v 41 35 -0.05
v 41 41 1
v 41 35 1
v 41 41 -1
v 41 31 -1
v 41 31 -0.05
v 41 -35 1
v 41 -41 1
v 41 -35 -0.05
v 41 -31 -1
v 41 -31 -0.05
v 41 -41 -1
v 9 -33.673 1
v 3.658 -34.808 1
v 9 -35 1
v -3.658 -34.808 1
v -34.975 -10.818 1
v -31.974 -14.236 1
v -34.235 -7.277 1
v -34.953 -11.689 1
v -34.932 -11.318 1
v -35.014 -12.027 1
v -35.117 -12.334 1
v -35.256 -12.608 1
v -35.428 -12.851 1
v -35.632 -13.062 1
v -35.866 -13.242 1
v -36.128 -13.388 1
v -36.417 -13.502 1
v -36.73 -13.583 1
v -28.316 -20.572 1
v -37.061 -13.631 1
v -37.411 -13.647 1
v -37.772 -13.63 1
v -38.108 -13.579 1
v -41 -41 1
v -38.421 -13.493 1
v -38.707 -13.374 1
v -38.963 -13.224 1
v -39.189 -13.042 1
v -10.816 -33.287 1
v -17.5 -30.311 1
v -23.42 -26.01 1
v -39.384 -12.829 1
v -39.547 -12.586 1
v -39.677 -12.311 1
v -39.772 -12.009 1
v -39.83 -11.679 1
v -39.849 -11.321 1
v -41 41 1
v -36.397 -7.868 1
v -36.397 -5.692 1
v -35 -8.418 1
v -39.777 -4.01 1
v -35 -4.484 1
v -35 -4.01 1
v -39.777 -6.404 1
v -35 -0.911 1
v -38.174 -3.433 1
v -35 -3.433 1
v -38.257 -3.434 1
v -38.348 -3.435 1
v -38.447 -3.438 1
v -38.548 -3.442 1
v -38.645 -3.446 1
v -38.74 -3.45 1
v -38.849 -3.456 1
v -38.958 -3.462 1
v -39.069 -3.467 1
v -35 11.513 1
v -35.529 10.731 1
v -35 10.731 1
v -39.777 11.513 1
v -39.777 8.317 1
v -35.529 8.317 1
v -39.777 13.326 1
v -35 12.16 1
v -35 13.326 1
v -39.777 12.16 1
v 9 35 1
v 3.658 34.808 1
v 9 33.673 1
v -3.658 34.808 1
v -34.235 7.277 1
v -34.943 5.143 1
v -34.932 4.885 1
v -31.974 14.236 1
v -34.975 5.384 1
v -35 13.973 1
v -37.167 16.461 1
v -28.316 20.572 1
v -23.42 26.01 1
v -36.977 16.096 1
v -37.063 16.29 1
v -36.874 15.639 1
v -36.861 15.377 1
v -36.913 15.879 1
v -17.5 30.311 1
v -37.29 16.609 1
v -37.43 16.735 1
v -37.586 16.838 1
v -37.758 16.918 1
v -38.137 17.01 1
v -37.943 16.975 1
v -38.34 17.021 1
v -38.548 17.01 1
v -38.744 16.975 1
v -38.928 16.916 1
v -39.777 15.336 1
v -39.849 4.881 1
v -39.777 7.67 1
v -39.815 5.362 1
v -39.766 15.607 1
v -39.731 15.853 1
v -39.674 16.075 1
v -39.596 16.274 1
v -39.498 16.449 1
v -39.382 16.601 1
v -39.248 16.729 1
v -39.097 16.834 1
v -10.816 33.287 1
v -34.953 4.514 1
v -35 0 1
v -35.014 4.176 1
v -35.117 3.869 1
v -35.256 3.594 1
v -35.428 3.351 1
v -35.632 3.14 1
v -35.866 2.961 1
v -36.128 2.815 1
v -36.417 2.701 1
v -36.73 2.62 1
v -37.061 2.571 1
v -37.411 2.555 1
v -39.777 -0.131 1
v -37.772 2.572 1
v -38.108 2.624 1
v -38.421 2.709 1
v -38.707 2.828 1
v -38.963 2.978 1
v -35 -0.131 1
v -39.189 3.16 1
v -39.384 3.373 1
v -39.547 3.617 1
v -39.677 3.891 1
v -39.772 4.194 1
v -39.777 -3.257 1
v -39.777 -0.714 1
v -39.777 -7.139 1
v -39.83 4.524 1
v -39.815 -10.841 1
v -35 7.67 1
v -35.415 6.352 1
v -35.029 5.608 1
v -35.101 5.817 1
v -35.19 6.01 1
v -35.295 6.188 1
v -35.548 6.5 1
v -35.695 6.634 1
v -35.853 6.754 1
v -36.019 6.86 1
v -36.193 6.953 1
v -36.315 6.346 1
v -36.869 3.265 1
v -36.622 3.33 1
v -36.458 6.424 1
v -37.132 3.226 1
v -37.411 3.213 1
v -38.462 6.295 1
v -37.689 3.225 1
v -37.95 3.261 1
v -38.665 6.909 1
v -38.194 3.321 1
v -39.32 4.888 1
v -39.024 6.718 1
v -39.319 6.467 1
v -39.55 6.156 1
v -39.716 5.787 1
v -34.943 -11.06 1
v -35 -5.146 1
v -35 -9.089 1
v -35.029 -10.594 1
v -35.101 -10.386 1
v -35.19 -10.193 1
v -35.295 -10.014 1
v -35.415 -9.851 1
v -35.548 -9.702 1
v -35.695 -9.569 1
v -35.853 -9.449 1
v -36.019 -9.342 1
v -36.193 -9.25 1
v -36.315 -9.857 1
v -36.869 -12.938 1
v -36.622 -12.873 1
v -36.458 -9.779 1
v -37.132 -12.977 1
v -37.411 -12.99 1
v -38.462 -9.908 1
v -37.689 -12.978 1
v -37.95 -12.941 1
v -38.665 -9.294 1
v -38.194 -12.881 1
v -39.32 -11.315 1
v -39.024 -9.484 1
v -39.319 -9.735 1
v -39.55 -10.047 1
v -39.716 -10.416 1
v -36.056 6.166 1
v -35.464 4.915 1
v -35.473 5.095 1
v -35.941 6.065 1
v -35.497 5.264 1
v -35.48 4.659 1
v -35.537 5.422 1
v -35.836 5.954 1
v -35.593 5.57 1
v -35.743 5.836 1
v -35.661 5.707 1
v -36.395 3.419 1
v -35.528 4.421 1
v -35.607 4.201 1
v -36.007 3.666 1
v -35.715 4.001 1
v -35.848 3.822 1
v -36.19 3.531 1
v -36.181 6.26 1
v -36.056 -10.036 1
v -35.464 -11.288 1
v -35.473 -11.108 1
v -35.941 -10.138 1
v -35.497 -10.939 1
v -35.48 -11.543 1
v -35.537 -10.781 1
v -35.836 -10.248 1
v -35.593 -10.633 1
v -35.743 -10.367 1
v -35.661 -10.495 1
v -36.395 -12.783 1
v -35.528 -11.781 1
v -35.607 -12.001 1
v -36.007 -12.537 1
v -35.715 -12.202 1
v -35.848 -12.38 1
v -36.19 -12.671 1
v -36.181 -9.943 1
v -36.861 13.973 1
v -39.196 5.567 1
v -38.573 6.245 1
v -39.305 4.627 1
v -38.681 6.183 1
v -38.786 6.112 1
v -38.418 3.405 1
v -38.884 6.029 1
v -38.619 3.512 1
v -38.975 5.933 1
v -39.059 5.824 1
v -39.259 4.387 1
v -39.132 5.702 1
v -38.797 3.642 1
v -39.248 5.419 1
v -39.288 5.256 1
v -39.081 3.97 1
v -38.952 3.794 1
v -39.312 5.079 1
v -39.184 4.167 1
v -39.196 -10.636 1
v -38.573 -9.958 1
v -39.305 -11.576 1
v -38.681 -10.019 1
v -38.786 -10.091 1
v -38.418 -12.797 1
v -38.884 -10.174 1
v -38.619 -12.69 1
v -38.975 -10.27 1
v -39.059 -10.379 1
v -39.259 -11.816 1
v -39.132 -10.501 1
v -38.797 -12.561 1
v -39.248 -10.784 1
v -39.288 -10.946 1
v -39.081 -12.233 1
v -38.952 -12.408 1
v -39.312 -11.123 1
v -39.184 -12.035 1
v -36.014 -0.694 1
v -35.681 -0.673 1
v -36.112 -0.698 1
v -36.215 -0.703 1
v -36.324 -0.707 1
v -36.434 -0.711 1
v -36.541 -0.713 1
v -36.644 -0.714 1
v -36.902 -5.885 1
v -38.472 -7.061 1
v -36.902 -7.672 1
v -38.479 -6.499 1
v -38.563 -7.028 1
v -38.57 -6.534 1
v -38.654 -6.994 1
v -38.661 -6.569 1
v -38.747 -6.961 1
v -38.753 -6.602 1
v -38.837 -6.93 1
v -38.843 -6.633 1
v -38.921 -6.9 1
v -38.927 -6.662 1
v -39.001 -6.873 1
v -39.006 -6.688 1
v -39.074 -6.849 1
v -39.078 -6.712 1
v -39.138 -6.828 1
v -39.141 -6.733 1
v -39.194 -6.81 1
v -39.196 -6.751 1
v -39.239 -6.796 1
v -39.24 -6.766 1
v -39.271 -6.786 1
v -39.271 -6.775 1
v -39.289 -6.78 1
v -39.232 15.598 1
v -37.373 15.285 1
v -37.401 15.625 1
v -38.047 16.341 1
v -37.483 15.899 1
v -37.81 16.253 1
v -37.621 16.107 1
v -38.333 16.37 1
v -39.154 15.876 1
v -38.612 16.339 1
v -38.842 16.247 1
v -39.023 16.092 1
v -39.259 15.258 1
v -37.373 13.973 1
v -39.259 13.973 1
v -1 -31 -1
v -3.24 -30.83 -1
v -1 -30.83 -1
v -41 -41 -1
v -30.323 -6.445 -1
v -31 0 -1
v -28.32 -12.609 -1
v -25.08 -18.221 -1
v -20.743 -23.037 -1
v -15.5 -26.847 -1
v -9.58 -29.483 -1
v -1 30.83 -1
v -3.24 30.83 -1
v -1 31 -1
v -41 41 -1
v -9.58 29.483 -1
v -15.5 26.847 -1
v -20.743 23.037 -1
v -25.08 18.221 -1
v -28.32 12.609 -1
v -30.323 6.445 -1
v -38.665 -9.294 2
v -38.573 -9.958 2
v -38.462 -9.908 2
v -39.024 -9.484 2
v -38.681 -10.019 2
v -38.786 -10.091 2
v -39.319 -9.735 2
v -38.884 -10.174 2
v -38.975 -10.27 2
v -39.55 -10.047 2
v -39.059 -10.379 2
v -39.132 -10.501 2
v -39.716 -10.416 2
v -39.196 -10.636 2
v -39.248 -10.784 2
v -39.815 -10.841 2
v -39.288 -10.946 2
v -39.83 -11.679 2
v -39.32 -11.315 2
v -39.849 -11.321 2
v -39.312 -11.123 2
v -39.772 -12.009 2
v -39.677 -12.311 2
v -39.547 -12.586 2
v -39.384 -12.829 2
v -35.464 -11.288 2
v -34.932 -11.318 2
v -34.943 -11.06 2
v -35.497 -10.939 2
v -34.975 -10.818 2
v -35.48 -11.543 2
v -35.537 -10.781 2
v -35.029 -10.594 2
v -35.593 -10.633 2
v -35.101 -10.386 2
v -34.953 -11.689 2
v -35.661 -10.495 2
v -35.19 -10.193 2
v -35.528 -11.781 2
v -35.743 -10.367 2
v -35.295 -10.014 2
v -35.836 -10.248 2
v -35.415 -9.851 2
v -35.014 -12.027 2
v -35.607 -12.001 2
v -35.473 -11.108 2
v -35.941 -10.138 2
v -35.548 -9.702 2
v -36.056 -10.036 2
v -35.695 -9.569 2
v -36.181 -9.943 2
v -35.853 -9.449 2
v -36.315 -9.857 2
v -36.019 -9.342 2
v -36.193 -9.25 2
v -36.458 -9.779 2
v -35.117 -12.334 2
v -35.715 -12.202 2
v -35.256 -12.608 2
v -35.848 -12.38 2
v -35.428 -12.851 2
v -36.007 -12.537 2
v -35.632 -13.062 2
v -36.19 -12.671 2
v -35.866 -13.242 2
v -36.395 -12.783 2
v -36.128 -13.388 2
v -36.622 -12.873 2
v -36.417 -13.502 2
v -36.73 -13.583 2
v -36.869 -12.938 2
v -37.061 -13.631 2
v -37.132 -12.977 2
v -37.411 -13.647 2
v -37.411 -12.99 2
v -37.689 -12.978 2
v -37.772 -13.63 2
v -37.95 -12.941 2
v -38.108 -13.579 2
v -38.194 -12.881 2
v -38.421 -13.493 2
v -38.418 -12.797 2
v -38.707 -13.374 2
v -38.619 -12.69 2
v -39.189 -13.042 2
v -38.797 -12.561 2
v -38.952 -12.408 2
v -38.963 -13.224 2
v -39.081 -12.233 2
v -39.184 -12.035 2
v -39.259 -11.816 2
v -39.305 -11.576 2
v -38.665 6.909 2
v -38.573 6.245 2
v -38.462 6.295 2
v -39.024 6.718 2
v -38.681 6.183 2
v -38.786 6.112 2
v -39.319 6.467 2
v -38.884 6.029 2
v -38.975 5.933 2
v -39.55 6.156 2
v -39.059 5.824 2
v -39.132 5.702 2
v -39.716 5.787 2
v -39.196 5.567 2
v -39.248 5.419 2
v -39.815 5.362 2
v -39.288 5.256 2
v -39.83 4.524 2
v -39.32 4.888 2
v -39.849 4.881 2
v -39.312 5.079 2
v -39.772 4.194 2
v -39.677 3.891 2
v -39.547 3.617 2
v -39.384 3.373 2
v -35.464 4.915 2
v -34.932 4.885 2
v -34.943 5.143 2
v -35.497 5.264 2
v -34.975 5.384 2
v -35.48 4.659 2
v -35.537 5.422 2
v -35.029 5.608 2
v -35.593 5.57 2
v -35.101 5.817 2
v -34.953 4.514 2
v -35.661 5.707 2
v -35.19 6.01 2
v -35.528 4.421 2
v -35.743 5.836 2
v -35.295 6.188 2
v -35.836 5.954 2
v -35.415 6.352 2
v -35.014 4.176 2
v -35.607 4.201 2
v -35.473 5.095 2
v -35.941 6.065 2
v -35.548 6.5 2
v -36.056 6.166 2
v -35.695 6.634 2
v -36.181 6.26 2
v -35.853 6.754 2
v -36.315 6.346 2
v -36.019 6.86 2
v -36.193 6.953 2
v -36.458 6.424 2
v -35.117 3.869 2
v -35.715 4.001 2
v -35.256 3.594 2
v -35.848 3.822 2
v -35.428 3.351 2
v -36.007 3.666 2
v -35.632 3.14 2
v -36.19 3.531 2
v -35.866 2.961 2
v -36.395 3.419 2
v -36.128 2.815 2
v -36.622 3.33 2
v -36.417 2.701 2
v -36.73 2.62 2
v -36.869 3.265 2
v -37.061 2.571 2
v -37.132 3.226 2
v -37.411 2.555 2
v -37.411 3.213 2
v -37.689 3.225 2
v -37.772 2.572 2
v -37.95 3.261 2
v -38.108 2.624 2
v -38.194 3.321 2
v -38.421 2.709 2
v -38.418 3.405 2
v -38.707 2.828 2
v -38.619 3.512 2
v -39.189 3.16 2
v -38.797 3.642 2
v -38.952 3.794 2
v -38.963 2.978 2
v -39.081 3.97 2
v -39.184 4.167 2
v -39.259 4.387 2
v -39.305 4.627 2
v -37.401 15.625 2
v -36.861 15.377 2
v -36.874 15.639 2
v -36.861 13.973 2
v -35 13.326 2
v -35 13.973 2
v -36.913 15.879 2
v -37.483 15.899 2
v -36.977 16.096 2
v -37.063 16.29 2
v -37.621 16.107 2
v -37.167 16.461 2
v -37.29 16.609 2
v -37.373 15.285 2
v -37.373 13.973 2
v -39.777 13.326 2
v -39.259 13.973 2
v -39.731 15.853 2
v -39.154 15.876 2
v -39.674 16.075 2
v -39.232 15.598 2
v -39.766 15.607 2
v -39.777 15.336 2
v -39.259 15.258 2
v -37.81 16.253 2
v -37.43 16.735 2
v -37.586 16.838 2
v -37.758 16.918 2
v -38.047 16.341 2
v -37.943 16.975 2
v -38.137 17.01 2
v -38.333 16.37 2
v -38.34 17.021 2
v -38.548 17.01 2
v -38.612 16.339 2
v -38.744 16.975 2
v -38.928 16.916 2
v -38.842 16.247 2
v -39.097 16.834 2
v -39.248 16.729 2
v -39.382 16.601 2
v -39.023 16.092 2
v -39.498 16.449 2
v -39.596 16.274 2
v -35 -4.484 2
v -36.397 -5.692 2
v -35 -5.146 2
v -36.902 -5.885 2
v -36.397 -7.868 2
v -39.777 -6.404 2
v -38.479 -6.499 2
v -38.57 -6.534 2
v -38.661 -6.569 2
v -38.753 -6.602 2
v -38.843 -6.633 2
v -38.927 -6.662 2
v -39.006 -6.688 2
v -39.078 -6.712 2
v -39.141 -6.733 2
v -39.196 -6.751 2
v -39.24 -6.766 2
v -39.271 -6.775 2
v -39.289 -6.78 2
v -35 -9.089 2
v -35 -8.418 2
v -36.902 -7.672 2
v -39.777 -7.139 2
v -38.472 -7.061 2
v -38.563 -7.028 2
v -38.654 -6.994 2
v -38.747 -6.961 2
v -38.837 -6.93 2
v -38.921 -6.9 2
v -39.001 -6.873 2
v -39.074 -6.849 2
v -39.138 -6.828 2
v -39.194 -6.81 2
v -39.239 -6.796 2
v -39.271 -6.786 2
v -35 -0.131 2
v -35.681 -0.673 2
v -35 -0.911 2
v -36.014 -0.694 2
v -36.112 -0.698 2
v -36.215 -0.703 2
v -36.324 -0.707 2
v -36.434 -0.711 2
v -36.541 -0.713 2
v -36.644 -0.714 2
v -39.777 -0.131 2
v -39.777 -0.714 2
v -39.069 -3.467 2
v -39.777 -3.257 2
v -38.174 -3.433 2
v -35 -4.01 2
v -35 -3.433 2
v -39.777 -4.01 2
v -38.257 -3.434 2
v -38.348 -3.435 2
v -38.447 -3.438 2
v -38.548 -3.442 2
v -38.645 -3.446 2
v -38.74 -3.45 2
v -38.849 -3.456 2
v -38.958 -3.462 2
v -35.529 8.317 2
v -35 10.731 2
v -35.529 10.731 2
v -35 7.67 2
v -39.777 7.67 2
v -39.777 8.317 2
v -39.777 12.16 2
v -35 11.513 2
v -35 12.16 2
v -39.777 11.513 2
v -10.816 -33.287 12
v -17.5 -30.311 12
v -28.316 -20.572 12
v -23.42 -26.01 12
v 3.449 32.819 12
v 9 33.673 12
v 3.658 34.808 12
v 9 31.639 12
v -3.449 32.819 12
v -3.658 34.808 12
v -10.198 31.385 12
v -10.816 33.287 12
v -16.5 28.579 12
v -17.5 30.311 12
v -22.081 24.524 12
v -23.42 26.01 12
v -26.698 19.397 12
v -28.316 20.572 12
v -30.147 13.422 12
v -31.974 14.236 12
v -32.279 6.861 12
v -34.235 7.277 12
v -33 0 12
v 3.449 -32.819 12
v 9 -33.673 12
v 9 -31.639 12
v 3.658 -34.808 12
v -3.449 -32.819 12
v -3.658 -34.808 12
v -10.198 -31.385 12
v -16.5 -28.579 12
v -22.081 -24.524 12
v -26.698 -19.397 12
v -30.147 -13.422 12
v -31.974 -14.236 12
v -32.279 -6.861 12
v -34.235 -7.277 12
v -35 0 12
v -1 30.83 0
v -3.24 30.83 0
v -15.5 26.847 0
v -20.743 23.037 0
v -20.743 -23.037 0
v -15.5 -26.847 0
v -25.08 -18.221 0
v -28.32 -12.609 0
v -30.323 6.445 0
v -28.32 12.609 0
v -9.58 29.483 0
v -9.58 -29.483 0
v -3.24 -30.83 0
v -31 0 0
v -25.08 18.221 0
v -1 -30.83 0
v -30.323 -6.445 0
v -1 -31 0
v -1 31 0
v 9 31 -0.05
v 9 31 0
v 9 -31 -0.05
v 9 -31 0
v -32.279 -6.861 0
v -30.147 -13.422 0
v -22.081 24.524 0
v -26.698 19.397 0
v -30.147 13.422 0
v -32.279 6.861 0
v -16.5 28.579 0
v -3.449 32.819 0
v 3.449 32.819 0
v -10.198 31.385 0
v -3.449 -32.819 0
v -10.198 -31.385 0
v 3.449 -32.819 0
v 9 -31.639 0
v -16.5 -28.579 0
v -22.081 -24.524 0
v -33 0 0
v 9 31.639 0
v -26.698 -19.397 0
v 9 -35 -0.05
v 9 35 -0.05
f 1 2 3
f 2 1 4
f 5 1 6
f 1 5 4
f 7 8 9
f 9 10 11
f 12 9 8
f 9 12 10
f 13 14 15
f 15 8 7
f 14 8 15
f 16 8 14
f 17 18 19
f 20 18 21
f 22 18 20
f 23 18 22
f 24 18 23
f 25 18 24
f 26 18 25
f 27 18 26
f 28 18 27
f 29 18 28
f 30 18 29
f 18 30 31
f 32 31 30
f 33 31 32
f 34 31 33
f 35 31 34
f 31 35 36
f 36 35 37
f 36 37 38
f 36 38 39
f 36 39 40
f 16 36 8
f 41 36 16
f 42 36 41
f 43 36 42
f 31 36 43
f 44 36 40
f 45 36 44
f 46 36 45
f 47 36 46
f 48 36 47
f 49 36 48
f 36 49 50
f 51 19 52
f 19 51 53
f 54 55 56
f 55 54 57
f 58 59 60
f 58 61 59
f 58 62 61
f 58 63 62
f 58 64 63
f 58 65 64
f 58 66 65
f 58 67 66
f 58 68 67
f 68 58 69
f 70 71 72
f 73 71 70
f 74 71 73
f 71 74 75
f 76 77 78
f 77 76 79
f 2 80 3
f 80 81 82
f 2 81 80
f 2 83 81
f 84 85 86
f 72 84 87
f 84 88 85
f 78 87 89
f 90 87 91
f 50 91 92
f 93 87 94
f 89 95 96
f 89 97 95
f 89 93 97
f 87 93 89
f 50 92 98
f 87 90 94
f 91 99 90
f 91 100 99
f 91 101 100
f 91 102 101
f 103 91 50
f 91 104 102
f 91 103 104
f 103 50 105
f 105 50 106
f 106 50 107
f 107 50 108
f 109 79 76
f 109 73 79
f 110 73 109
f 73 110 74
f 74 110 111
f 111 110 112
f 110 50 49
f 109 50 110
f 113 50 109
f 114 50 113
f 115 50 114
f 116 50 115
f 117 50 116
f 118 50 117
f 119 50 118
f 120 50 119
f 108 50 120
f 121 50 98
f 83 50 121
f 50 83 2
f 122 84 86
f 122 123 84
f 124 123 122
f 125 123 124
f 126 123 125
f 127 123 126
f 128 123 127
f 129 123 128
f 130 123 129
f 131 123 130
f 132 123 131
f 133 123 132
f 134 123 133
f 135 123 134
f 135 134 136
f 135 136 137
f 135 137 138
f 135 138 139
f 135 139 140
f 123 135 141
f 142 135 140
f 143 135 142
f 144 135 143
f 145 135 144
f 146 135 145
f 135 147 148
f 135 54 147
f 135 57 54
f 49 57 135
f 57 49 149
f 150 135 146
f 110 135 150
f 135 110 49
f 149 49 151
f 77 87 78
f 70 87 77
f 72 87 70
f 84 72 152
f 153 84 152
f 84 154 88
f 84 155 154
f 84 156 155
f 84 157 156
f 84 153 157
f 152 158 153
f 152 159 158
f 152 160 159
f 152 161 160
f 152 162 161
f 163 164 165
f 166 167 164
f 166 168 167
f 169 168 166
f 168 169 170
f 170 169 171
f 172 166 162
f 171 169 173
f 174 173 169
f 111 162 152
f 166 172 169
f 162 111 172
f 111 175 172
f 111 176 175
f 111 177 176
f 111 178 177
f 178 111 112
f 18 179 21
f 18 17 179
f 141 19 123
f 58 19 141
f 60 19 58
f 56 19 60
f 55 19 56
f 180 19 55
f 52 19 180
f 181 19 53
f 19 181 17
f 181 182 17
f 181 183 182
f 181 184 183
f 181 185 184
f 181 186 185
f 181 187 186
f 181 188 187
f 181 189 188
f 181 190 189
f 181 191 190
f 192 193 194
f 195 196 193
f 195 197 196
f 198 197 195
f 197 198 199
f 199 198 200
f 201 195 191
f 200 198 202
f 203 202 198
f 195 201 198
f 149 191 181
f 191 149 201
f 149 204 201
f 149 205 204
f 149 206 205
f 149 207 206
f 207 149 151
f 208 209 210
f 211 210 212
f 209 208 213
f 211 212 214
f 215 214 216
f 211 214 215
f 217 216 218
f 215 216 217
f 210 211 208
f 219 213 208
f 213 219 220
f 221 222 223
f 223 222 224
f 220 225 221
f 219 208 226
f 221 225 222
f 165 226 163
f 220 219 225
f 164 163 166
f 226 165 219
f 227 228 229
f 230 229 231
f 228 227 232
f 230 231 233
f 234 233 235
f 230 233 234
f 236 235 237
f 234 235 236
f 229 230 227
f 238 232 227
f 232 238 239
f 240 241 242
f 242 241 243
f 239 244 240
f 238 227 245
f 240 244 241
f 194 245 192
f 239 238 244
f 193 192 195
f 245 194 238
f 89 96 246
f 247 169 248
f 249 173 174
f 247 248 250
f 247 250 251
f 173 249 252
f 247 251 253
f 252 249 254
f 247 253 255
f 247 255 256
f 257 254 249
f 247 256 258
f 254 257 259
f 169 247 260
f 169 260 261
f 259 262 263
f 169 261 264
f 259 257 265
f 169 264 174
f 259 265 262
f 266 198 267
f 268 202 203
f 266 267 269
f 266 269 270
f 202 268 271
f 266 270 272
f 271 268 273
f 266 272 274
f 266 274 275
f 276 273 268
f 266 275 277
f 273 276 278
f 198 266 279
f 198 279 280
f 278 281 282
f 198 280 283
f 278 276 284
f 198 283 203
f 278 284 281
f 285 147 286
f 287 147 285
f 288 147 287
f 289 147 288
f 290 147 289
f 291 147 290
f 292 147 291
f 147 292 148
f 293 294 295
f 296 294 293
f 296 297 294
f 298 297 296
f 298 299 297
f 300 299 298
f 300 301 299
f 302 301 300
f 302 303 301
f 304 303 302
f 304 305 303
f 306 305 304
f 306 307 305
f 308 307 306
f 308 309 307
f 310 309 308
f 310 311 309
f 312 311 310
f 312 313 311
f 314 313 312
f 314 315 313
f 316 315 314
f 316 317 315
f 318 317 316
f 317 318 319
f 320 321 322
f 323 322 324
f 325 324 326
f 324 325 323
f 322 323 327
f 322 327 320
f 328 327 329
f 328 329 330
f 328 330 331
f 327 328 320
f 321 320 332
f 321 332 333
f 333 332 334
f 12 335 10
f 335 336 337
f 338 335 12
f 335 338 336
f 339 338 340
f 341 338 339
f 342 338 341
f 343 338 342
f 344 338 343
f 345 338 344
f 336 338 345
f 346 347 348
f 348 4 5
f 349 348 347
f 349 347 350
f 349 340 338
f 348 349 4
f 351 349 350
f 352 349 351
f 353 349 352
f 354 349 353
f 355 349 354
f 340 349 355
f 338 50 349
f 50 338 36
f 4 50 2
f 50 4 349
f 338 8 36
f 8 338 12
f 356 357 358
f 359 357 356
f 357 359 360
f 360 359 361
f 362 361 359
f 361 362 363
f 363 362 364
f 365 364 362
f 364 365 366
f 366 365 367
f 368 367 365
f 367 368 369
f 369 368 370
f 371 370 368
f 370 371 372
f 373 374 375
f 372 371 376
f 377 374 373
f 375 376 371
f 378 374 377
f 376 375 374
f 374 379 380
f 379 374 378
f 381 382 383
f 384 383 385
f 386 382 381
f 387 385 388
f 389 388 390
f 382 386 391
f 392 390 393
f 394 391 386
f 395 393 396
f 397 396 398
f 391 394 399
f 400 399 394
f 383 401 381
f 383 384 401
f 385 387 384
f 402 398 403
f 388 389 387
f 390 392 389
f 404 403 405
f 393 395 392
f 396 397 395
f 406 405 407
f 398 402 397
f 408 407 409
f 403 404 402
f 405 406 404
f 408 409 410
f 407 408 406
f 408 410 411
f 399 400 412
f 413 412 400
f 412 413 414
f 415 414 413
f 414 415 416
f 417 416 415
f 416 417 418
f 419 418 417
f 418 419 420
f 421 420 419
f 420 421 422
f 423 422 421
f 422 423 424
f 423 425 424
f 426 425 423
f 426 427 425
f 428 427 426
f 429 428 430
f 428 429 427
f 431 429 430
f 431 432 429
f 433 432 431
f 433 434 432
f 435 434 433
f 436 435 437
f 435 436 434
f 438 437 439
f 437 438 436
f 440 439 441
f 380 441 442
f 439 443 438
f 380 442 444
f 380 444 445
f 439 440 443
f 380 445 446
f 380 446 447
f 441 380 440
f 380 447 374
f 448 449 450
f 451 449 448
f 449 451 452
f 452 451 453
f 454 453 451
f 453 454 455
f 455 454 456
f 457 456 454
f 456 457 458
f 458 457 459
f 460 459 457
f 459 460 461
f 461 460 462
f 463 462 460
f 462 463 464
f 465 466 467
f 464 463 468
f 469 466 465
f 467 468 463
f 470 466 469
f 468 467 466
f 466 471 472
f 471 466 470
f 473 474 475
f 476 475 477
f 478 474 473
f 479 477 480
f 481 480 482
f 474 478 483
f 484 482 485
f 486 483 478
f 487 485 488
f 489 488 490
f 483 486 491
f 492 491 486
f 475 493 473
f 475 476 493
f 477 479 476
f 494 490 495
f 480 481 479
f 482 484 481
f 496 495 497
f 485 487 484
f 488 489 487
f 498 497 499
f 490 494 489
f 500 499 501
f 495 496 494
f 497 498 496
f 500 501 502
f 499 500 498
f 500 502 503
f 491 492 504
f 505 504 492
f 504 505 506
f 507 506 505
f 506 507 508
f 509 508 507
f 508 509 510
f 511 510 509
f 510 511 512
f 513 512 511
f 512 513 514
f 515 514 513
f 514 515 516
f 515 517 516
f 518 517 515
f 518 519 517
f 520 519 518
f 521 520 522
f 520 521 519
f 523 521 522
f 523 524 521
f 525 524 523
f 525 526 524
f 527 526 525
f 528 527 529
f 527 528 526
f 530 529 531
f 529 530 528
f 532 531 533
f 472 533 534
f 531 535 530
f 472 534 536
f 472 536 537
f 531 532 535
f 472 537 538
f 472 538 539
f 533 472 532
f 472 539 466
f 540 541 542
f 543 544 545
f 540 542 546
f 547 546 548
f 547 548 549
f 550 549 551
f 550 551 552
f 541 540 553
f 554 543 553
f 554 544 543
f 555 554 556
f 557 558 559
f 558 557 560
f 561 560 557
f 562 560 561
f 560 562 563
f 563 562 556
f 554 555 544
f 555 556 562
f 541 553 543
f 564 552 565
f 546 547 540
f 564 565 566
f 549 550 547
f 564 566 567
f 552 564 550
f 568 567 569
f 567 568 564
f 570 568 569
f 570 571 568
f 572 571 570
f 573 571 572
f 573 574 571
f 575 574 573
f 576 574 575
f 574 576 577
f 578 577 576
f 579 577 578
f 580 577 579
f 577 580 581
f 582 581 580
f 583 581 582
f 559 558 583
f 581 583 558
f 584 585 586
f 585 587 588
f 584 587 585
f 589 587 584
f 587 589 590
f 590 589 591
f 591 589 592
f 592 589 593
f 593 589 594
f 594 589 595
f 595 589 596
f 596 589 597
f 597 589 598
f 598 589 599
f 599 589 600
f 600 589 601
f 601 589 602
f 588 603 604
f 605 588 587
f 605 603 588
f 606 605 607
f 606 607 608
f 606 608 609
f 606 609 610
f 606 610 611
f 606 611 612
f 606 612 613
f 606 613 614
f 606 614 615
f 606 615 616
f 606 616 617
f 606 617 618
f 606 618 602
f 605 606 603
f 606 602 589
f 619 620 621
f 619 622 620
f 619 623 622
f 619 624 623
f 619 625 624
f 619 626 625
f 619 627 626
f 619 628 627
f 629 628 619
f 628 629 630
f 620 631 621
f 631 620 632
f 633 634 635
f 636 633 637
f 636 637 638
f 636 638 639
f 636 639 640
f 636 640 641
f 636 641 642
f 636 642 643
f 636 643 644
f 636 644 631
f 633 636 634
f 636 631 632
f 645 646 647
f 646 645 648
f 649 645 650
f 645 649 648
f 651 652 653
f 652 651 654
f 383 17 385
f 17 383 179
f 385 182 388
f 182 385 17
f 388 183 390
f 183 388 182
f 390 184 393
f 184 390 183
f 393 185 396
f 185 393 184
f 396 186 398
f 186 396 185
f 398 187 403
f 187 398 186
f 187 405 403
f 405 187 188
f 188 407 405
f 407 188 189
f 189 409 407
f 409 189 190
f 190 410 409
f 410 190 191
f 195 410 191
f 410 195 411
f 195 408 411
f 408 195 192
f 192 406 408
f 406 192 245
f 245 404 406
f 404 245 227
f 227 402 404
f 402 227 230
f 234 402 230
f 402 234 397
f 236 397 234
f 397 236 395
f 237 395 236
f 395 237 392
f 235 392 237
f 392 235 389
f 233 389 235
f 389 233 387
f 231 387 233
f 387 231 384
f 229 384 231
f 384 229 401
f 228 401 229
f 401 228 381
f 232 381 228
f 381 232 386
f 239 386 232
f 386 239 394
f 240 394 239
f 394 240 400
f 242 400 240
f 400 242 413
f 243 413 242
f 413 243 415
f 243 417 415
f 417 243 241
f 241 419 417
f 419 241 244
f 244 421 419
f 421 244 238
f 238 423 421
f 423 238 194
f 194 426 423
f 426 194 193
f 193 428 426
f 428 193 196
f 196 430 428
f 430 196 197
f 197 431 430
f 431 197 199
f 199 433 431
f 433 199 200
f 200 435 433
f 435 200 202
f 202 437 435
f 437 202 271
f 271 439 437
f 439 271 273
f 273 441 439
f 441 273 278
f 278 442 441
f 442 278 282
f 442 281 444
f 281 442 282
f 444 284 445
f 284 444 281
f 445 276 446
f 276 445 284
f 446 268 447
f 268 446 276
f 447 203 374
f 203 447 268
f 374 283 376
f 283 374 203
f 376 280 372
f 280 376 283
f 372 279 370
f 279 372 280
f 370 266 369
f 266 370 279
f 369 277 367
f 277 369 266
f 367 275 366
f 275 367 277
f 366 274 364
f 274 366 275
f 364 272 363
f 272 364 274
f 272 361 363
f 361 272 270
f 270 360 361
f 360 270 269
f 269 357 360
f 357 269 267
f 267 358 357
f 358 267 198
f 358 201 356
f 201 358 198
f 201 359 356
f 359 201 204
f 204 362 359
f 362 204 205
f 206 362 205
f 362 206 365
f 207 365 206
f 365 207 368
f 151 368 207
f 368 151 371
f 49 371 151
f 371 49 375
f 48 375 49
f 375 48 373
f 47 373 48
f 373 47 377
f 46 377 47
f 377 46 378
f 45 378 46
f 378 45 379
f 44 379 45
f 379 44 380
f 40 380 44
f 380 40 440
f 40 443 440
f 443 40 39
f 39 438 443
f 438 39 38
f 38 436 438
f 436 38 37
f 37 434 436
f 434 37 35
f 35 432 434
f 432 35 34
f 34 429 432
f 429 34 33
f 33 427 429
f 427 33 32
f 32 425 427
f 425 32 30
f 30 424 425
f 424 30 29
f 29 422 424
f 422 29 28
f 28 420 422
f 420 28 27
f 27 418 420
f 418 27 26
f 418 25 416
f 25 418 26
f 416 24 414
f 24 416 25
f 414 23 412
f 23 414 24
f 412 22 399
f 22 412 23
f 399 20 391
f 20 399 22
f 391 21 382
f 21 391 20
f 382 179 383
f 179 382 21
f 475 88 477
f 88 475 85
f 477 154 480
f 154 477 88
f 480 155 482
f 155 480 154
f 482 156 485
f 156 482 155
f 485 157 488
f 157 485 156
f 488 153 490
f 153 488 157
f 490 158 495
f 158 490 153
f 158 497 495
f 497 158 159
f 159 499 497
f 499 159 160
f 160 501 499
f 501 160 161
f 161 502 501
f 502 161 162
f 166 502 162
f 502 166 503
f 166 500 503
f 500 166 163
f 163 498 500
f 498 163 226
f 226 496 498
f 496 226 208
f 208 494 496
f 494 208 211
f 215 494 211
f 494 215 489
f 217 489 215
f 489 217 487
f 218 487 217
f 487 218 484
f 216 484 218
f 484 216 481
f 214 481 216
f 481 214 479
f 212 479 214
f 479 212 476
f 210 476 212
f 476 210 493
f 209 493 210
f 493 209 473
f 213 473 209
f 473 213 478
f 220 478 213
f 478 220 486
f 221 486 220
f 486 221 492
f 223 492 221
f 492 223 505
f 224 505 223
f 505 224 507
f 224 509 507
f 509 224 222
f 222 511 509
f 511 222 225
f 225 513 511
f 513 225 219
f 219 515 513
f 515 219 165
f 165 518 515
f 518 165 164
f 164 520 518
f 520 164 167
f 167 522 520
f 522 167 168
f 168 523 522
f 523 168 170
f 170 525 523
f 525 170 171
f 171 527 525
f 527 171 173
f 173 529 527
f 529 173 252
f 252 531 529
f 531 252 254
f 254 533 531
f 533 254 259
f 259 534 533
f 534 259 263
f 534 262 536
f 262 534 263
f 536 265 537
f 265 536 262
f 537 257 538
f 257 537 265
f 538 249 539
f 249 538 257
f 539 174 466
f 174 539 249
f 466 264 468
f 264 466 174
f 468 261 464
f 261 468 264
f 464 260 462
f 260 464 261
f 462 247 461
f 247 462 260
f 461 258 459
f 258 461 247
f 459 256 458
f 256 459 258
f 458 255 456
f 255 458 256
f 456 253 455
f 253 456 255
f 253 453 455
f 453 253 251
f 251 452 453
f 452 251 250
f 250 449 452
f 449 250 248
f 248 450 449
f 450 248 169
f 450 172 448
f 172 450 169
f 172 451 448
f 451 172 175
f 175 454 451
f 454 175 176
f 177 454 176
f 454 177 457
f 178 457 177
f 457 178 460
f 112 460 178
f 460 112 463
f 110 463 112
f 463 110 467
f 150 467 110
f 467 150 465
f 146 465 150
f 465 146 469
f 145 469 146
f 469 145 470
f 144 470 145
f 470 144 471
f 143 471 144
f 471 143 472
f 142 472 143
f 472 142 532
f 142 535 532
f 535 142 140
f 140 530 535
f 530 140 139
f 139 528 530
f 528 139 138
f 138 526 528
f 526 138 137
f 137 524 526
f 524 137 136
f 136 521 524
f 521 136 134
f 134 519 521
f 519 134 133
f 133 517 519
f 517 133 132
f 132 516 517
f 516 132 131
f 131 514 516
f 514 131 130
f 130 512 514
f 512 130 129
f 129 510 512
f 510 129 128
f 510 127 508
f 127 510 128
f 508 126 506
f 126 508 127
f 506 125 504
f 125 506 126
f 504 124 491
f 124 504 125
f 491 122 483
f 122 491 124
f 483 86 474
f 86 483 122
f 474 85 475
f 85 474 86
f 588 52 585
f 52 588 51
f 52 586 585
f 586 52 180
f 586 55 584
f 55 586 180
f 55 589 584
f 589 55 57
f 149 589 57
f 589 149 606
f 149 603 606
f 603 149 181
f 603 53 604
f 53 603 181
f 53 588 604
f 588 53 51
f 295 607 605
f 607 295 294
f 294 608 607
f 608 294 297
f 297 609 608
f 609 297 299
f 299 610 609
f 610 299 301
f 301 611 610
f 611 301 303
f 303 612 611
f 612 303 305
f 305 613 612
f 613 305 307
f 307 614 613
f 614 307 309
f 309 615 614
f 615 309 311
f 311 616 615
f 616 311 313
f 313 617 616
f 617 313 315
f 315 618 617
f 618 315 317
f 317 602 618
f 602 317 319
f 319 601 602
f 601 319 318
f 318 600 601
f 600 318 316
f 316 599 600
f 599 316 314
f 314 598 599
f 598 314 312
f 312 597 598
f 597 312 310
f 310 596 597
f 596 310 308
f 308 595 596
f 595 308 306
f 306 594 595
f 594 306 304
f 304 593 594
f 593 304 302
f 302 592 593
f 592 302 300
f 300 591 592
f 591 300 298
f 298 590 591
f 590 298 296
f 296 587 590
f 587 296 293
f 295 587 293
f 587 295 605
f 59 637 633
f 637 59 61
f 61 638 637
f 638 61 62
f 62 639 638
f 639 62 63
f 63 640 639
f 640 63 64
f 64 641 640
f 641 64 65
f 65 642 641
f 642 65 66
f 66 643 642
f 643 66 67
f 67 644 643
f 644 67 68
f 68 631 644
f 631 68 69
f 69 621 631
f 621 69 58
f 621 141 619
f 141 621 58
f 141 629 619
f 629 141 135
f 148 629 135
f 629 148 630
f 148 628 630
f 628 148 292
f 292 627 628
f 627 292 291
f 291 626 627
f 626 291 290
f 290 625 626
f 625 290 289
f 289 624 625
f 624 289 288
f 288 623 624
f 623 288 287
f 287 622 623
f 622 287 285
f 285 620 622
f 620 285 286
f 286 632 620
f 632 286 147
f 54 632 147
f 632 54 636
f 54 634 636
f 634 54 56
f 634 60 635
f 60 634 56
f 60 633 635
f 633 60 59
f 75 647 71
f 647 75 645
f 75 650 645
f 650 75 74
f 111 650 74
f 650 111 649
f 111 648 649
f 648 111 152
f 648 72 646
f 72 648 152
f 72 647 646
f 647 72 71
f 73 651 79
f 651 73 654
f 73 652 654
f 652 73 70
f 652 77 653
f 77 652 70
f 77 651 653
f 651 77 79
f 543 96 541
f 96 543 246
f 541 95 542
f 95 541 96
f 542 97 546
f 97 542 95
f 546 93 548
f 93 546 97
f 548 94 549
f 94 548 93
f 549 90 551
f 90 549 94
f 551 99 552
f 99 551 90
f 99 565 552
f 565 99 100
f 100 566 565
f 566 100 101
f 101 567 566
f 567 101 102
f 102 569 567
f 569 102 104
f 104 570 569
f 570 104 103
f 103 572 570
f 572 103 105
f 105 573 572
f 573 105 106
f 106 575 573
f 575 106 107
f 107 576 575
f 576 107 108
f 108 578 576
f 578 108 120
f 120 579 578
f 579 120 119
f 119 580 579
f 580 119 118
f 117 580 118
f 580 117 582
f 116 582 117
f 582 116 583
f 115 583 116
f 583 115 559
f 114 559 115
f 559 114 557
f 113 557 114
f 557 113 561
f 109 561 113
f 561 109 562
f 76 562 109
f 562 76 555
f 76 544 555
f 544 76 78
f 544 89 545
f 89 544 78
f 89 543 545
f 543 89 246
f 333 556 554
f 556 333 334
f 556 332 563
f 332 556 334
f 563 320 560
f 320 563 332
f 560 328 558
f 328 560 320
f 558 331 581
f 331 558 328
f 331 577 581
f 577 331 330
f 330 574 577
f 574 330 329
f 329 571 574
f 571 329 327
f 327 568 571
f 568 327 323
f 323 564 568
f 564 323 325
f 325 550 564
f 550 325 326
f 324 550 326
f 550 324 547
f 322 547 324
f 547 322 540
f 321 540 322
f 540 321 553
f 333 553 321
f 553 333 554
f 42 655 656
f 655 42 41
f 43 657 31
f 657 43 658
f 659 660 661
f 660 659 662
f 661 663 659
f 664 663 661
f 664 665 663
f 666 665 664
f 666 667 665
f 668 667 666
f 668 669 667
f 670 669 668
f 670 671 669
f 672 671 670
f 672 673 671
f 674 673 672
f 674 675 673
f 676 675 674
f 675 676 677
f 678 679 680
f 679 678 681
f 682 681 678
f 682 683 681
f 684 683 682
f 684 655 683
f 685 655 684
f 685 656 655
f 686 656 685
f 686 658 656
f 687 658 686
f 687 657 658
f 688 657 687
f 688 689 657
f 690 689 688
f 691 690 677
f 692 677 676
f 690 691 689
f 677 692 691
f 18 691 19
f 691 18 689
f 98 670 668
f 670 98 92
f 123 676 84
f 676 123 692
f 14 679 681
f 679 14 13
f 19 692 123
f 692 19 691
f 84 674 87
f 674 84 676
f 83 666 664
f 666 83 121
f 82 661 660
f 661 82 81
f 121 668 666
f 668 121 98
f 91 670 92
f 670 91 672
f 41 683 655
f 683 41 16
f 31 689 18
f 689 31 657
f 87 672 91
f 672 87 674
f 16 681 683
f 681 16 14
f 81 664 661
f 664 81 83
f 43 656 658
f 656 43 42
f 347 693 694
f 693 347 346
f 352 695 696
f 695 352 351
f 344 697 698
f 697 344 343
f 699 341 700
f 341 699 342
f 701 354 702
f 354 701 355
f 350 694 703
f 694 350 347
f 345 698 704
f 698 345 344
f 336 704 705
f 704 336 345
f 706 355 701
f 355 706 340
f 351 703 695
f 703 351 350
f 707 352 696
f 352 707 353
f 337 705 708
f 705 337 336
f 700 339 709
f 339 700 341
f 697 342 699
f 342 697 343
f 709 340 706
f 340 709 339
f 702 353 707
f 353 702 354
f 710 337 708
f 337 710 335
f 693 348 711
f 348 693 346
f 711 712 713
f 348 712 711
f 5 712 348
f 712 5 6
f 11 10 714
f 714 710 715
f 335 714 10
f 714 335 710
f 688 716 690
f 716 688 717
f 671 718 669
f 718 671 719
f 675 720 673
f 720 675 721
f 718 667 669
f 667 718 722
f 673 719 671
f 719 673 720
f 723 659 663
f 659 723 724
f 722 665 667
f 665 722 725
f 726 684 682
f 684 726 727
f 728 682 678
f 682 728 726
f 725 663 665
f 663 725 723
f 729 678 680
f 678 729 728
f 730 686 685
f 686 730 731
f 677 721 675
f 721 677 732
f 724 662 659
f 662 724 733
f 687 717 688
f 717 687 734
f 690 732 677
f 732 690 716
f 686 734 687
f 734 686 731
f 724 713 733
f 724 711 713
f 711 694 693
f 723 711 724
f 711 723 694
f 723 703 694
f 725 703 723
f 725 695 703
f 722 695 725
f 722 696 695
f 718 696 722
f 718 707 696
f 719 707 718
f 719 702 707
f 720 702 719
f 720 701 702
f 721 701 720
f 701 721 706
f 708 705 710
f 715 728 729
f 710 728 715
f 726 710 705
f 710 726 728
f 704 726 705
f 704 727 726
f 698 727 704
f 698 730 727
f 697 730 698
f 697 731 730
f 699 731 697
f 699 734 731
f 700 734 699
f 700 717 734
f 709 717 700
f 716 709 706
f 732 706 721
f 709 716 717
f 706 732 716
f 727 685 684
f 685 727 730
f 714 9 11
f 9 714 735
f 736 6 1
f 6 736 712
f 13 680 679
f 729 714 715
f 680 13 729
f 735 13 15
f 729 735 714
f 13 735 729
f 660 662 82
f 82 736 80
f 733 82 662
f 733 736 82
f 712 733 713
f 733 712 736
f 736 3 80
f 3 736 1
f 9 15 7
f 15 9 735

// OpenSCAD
//Line Marking paint can retaining clip

length=82;
width=82;
diameter=62;
thickness=2;

module clip(length,width,diameter,thickness) {
    difference() {
        union(){
   cube([length,width,thickness],center=true); 
            linear_extrude(thickness ) translate([-35,-14,0]) rotate([0,0,90])  text("CAN CLIP",5);
            cylinder(h=12,d=70);
        }
   union() {
       cylinder(h=thickness+0.1,d=diameter,center=true);
       translate([30,0,0]) cube([diameter,diameter,thickness+0.1],center=true);
       cylinder(h=12.1,d=66);
       translate([44,0,6]) cube([70,70,12.1],center=true);
   }
}
}

clip(length,width,diameter,thickness);
